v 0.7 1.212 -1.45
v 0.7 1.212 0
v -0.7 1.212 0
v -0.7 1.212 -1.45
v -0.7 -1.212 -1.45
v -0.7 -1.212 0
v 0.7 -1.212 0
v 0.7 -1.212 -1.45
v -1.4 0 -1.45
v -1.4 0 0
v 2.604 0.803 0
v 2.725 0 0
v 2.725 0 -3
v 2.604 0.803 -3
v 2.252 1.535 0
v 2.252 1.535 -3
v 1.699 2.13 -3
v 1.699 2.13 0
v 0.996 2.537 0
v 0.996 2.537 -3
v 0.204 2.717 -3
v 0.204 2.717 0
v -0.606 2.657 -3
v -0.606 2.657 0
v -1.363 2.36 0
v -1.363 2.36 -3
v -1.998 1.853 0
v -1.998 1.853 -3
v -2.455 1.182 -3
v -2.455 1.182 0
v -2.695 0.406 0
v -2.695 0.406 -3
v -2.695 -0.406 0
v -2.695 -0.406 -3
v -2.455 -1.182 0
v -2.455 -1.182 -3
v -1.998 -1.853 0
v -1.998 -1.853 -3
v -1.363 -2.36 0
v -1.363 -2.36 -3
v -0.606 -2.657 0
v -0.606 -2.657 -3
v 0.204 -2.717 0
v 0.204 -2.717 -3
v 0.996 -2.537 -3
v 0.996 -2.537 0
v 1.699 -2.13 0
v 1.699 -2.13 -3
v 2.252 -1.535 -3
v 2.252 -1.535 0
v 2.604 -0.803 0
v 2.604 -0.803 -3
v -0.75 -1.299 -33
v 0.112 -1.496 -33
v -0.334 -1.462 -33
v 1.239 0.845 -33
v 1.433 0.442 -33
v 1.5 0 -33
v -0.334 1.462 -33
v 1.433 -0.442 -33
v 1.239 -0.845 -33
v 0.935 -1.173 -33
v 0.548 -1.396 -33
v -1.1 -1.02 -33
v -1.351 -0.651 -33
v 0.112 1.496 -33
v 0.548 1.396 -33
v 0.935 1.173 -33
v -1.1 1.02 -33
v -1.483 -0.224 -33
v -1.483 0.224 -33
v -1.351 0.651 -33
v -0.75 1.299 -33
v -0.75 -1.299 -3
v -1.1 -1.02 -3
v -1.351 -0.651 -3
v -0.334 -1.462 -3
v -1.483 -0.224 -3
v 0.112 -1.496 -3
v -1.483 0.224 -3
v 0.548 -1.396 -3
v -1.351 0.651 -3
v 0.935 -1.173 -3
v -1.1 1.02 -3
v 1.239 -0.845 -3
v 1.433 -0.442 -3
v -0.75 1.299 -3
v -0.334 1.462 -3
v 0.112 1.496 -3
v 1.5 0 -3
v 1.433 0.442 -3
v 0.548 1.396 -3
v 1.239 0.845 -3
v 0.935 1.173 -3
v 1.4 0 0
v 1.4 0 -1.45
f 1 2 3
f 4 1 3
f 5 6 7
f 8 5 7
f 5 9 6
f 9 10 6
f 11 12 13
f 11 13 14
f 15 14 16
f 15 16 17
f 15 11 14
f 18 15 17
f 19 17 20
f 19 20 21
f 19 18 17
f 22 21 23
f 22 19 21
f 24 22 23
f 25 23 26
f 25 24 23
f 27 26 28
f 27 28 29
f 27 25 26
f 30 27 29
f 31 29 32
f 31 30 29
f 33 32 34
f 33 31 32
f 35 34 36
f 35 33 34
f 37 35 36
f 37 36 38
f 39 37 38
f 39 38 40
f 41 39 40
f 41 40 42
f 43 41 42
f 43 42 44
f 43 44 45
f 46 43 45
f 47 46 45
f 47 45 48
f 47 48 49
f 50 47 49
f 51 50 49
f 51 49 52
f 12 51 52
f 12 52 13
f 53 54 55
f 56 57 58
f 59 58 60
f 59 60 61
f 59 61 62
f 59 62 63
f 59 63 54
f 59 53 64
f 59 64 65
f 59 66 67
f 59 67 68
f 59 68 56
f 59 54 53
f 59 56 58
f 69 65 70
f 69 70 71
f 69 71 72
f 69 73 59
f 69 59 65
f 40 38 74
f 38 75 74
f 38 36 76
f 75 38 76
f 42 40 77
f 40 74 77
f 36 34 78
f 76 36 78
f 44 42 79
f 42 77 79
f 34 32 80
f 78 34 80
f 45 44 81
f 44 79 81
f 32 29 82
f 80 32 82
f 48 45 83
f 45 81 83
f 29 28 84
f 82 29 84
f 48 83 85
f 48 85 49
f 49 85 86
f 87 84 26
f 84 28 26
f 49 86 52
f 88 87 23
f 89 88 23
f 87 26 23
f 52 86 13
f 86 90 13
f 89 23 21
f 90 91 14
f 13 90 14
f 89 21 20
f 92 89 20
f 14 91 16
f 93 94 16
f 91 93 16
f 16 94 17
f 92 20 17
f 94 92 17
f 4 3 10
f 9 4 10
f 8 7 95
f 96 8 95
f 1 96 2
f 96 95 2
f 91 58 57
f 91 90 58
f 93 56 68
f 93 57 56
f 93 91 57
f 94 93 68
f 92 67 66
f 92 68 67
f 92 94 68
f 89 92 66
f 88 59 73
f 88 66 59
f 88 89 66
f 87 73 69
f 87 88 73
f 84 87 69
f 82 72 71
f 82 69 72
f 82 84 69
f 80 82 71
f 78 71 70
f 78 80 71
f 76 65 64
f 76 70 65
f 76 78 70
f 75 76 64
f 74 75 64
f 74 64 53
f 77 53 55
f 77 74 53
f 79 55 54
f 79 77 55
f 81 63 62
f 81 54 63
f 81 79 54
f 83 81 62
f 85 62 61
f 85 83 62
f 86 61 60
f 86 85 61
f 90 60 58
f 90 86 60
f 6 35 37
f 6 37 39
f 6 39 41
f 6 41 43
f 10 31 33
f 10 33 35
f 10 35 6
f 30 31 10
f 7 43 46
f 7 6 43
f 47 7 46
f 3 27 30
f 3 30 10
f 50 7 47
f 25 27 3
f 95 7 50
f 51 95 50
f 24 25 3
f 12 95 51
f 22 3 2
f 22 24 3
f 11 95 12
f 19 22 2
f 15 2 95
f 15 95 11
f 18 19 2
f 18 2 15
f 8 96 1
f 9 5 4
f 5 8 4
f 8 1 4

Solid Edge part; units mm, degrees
sketch "Sketch1" plane through (0, 0, 0) normal (0, 0, 1) x (1, 0, 0)
  circle A0 centre (0, 0) radius 2.725
extrude "Protrusion1" add sketch "Sketch1" against normal blind 3
sketch "Sketch2" plane through (0, 0, 0) normal (0, 0, 1) x (1, 0, 0)
  line L0 (-0.7, -1.2124) -> (-1.05, -0.6062)
  line L1 (-1.4, 0) -> (-1.05, -0.6062)
  line L2 (-1.4, 0) -> (-1.05, 0.6062)
  line L3 (-0.7, 1.2124) -> (-1.05, 0.6062)
  line L4 (-0.7, 1.2124) -> (0, 1.2124)
  line L5 (0.7, 1.2124) -> (0, 1.2124)
  line L6 (0.7, 1.2124) -> (1.05, 0.6062)
  line L7 (1.4, 0) -> (1.05, 0.6062)
  line L8 (1.4, 0) -> (1.05, -0.6062)
  line L9 (0.7, -1.2124) -> (1.05, -0.6062)
  line L10 (0.7, -1.2124) -> (0, -1.2124)
  line L11 (-0.7, -1.2124) -> (0, -1.2124)
extrude "ExtrudedCutout_1" cut sketch "Sketch2" against normal blind 1.45
sketch "Sketch3" plane through (0, 0, -3) normal (0, 0, -1) x (1, 0, 0)
  circle A0 centre (0, 0) radius 1.5
extrude "ExtrudedProtrusion_2" add sketch "Sketch3" along normal blind 30
cosmetic_thread "Thread_2" size "M3" thread depth 17
